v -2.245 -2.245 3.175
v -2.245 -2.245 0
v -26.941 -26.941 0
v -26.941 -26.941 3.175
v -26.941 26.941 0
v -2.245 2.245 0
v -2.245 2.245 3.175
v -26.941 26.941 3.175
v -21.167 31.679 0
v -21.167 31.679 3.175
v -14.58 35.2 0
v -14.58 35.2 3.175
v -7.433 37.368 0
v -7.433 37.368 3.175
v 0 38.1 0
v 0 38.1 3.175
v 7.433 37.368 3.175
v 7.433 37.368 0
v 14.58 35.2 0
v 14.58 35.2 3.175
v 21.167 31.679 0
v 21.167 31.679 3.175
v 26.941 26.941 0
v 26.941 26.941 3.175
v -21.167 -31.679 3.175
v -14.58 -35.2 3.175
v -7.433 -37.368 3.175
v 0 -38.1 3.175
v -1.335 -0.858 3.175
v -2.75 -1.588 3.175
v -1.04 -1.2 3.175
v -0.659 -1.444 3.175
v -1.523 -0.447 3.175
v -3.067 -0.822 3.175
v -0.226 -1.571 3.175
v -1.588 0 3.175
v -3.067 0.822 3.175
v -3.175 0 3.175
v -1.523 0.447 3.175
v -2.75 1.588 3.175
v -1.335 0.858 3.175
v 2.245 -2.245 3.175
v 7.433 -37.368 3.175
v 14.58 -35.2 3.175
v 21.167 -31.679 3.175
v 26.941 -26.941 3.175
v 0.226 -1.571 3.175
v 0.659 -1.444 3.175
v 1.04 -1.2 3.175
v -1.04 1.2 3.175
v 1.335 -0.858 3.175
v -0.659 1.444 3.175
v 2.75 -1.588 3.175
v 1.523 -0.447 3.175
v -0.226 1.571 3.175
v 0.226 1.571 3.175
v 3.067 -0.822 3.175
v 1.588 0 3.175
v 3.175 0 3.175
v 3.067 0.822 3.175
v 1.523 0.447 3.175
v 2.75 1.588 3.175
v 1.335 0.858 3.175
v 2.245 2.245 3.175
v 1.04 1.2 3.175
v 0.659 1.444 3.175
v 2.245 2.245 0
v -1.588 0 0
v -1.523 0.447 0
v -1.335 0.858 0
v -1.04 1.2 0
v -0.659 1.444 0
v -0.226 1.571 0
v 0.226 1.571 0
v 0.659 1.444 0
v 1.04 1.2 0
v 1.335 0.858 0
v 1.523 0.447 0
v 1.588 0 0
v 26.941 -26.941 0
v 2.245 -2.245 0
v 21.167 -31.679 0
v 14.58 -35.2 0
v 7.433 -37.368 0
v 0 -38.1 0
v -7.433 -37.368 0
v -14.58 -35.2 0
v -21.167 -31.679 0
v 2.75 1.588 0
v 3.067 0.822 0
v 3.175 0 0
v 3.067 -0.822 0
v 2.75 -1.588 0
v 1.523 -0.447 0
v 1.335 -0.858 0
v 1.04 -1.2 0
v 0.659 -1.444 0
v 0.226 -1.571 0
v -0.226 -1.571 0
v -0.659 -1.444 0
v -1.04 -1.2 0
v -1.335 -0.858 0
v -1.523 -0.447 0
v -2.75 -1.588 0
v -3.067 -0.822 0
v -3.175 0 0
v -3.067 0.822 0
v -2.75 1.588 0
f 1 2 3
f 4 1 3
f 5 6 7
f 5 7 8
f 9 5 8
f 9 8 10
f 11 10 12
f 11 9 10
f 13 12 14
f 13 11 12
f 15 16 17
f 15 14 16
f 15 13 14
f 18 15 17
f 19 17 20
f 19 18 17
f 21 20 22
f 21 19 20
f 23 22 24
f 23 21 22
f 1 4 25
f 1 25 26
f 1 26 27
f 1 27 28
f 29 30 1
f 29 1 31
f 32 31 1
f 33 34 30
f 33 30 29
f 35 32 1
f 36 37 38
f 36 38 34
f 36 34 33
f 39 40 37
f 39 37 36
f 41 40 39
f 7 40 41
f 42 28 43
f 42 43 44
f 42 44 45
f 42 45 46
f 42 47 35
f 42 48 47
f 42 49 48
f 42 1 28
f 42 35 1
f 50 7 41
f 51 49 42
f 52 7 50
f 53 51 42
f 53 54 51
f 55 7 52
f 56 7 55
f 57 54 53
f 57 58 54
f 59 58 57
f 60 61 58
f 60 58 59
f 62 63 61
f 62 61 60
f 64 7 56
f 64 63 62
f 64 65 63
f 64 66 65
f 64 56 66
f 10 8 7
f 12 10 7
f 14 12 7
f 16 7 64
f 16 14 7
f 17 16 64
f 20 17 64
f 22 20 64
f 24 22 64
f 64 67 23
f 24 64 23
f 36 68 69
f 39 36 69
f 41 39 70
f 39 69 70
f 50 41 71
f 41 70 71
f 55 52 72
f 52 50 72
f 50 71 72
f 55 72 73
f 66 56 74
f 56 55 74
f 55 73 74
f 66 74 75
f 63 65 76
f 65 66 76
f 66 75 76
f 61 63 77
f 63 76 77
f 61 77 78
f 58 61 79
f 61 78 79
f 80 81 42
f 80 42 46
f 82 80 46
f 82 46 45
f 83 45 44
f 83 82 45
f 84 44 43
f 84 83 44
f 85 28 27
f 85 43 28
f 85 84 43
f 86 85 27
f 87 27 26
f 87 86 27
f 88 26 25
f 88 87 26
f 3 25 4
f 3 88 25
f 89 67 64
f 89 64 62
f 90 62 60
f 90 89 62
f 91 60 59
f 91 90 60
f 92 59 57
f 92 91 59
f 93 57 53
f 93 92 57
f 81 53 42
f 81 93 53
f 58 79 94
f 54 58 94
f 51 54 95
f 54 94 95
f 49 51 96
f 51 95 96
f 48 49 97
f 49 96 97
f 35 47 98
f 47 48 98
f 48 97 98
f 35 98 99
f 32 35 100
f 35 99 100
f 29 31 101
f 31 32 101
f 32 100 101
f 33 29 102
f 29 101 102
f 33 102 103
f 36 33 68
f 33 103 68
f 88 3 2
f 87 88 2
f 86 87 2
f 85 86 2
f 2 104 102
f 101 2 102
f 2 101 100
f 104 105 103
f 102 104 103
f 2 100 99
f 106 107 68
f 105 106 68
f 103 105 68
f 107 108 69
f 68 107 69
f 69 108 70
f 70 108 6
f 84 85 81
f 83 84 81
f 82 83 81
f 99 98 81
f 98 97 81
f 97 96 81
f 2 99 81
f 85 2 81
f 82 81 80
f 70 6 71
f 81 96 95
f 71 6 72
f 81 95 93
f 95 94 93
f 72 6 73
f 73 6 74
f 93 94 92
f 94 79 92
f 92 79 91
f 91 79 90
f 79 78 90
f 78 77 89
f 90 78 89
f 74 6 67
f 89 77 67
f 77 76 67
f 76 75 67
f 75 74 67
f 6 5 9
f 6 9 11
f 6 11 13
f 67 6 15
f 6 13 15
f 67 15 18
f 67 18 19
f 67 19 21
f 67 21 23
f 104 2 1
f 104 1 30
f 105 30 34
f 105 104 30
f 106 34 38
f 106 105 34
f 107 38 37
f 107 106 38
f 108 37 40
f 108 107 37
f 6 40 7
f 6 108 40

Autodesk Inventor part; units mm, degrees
ref_plane "YZ Plane" through (0, 0, 0) normal (1, 0, 0) x (0, 1, 0)
ref_plane "XZ Plane" through (0, 0, 0) normal (0, 1, 0) x (-1, 0, 0)
ref_plane "XY Plane" through (0, 0, 0) normal (0, 0, 1) x (1, 0, 0)
sketch "Sketch1" plane through (0, 0, 0) normal (0, 0, 1) x (1, 0, 0)
  line L0 (-2.2451, -2.2451) -> (-26.9408, -26.9408)
  line L1 (2.2451, -2.2451) -> (26.9408, -26.9408)
  line L2 (2.2451, 2.2451) -> (26.9408, 26.9408)
  line L3 (-2.2451, 2.2451) -> (-26.9408, 26.9408)
  circle A0 centre (0, 0) radius 1.5875
  arc A1 (2.2451, -2.2451) -> (2.2451, 2.2451) centre (0, 0) ccw
  arc A2 (-2.2451, 2.2451) -> (-2.2451, -2.2451) centre (0, 0) ccw
  line L4 (0, 0) -> (-1.5875, 0)
  arc A3 (26.9408, 26.9408) -> (-26.9408, 26.9408) centre (0, 0) ccw
  arc A4 (-26.9408, -26.9408) -> (26.9408, -26.9408) centre (0, 0) ccw
  dimension "d5" = 3.175
  dimension "d1" = 90
  dimension "d2" = 90
  dimension "d3" = 90
extrude "Extrusion1" add sketch "Sketch1" along normal blind 3.175
properties part number "Release2"
